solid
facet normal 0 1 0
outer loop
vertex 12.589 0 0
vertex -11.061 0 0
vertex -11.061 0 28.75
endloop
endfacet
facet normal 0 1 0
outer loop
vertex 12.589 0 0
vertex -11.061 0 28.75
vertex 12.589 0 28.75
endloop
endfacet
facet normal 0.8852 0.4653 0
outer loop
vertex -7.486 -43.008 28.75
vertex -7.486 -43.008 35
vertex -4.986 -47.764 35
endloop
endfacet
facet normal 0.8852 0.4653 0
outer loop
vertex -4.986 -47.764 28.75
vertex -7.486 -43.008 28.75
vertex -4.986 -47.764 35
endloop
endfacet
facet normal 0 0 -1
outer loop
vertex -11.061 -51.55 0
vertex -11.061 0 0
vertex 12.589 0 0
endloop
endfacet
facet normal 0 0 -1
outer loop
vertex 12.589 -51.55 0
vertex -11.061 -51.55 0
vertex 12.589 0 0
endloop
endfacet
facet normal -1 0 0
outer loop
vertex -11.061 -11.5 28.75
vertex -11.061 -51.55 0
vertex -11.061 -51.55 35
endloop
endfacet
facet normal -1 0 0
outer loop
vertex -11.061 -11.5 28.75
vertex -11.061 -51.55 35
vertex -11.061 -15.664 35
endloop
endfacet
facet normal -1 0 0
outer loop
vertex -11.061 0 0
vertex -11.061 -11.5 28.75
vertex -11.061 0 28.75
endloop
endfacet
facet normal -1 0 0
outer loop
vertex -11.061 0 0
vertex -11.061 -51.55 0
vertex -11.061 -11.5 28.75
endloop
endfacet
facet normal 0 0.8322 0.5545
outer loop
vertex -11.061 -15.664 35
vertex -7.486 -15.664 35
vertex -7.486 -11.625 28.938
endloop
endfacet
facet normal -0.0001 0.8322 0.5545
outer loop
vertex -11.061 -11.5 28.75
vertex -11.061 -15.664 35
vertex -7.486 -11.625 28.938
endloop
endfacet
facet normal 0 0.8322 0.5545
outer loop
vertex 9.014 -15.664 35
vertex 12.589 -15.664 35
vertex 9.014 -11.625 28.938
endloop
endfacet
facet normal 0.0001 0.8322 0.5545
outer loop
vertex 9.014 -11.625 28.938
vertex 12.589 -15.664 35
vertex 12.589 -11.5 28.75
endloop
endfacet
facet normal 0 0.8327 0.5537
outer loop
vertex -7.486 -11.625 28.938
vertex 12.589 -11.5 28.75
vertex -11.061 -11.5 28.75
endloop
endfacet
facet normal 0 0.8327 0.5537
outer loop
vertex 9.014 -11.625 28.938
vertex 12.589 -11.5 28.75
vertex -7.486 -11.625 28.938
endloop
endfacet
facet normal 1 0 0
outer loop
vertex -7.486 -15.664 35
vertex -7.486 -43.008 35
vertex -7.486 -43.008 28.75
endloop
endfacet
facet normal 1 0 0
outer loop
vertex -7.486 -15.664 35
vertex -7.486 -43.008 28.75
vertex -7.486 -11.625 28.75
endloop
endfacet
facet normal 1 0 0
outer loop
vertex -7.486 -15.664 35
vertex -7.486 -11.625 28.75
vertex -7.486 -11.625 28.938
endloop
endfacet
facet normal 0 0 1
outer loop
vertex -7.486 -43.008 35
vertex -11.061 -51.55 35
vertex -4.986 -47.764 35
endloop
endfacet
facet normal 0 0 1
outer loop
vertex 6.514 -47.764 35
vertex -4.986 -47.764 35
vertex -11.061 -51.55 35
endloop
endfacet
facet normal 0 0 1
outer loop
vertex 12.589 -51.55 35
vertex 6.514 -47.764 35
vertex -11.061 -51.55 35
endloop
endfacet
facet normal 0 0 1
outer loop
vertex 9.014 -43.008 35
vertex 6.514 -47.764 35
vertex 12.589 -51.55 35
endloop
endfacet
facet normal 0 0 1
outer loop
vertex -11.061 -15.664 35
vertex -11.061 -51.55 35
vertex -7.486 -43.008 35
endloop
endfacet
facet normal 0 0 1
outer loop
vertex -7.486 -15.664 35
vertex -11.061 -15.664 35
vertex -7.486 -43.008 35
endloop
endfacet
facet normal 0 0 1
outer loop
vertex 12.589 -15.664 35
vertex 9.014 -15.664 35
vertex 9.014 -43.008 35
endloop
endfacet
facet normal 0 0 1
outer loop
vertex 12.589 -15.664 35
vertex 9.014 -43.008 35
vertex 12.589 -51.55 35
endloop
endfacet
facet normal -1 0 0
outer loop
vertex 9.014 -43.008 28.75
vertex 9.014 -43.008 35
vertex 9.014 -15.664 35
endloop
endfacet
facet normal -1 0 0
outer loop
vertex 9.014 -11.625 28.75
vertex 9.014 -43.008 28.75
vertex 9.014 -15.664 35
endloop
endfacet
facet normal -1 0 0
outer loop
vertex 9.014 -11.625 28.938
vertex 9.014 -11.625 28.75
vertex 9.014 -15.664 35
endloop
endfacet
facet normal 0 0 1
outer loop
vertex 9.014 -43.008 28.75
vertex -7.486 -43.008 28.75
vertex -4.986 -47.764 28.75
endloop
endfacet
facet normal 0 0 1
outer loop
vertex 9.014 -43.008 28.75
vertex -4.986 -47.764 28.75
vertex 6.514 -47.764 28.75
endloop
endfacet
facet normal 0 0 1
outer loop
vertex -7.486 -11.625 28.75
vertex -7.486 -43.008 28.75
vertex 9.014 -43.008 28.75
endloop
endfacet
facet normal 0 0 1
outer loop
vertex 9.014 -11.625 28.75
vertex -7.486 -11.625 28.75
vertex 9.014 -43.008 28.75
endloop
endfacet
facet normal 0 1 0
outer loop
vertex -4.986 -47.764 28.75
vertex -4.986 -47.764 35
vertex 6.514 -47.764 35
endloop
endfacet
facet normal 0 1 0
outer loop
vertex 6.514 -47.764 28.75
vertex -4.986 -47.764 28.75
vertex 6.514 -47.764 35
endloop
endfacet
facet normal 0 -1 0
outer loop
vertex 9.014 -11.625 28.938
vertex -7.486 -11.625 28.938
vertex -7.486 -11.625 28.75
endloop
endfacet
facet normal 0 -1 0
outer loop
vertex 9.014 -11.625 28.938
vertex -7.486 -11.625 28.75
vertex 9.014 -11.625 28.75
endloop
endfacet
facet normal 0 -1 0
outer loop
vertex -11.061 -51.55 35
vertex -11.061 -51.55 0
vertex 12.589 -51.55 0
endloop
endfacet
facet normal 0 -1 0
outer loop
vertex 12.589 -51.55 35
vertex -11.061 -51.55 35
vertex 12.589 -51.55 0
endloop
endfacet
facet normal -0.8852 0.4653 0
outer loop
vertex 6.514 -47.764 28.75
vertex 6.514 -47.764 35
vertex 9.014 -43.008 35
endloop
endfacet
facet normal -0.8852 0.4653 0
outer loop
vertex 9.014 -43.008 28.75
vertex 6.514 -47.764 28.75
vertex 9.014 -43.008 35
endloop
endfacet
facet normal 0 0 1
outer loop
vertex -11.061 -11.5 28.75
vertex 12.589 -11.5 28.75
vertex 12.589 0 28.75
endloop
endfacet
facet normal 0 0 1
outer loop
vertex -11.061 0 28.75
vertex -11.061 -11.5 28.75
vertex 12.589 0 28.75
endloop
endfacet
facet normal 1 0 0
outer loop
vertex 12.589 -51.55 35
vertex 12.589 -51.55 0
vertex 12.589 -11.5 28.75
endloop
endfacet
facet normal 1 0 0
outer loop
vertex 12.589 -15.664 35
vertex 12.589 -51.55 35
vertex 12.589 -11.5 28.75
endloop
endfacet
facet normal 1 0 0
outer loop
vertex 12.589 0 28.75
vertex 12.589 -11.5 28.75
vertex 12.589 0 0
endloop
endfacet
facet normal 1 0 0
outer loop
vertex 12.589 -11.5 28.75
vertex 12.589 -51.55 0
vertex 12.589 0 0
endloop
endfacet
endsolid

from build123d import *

# Parameters (mm, degrees)
F0_W     = 23.65
F0_H     = 51.55
F1_DEPTH = 35
F3_DEPTH = 23.651
F5_DEPTH = 6.25
F6_W     = 16.5
F6_H     = 4.038704
F7_DEPTH = 6.25


with BuildPart() as f1:
    # F0 (on Top) → F1 (new body)
    with BuildSketch(Plane.XY):
        with Locations((0.764201, -25.775)):
            Rectangle(F0_W, F0_H)
    extrude(amount=F1_DEPTH)

    # F2 (on face) → F3 (cut, through all)
    with BuildSketch(Plane.YZ.offset(12.589201)):
        Polygon((0, 28.75), (0, 35), (-15.663622, 35), (-11.5, 28.75), align=None)
    extrude(amount=-F3_DEPTH, mode=Mode.SUBTRACT)

    # F4 (on face) → F5 (cut)
    with BuildSketch(Plane.XY.offset(35)):
        Polygon((-4.985799, -47.763622), (0.764201, -47.763622), (6.514201, -47.763622), (9.014201, -43.008048), (9.014201, -15.663622), (0.764201, -15.663622), (-7.485799, -15.663622), (-7.485799, -43.008048), align=None)
    extrude(amount=-F5_DEPTH, mode=Mode.SUBTRACT)

    # F6 (on face) → F7 (cut)
    with BuildSketch(Plane.XY.offset(35)):
        with Locations((0.764201, -13.64427)):
            Rectangle(F6_W, F6_H)
    extrude(amount=-F7_DEPTH, mode=Mode.SUBTRACT)


solid = f1.part
